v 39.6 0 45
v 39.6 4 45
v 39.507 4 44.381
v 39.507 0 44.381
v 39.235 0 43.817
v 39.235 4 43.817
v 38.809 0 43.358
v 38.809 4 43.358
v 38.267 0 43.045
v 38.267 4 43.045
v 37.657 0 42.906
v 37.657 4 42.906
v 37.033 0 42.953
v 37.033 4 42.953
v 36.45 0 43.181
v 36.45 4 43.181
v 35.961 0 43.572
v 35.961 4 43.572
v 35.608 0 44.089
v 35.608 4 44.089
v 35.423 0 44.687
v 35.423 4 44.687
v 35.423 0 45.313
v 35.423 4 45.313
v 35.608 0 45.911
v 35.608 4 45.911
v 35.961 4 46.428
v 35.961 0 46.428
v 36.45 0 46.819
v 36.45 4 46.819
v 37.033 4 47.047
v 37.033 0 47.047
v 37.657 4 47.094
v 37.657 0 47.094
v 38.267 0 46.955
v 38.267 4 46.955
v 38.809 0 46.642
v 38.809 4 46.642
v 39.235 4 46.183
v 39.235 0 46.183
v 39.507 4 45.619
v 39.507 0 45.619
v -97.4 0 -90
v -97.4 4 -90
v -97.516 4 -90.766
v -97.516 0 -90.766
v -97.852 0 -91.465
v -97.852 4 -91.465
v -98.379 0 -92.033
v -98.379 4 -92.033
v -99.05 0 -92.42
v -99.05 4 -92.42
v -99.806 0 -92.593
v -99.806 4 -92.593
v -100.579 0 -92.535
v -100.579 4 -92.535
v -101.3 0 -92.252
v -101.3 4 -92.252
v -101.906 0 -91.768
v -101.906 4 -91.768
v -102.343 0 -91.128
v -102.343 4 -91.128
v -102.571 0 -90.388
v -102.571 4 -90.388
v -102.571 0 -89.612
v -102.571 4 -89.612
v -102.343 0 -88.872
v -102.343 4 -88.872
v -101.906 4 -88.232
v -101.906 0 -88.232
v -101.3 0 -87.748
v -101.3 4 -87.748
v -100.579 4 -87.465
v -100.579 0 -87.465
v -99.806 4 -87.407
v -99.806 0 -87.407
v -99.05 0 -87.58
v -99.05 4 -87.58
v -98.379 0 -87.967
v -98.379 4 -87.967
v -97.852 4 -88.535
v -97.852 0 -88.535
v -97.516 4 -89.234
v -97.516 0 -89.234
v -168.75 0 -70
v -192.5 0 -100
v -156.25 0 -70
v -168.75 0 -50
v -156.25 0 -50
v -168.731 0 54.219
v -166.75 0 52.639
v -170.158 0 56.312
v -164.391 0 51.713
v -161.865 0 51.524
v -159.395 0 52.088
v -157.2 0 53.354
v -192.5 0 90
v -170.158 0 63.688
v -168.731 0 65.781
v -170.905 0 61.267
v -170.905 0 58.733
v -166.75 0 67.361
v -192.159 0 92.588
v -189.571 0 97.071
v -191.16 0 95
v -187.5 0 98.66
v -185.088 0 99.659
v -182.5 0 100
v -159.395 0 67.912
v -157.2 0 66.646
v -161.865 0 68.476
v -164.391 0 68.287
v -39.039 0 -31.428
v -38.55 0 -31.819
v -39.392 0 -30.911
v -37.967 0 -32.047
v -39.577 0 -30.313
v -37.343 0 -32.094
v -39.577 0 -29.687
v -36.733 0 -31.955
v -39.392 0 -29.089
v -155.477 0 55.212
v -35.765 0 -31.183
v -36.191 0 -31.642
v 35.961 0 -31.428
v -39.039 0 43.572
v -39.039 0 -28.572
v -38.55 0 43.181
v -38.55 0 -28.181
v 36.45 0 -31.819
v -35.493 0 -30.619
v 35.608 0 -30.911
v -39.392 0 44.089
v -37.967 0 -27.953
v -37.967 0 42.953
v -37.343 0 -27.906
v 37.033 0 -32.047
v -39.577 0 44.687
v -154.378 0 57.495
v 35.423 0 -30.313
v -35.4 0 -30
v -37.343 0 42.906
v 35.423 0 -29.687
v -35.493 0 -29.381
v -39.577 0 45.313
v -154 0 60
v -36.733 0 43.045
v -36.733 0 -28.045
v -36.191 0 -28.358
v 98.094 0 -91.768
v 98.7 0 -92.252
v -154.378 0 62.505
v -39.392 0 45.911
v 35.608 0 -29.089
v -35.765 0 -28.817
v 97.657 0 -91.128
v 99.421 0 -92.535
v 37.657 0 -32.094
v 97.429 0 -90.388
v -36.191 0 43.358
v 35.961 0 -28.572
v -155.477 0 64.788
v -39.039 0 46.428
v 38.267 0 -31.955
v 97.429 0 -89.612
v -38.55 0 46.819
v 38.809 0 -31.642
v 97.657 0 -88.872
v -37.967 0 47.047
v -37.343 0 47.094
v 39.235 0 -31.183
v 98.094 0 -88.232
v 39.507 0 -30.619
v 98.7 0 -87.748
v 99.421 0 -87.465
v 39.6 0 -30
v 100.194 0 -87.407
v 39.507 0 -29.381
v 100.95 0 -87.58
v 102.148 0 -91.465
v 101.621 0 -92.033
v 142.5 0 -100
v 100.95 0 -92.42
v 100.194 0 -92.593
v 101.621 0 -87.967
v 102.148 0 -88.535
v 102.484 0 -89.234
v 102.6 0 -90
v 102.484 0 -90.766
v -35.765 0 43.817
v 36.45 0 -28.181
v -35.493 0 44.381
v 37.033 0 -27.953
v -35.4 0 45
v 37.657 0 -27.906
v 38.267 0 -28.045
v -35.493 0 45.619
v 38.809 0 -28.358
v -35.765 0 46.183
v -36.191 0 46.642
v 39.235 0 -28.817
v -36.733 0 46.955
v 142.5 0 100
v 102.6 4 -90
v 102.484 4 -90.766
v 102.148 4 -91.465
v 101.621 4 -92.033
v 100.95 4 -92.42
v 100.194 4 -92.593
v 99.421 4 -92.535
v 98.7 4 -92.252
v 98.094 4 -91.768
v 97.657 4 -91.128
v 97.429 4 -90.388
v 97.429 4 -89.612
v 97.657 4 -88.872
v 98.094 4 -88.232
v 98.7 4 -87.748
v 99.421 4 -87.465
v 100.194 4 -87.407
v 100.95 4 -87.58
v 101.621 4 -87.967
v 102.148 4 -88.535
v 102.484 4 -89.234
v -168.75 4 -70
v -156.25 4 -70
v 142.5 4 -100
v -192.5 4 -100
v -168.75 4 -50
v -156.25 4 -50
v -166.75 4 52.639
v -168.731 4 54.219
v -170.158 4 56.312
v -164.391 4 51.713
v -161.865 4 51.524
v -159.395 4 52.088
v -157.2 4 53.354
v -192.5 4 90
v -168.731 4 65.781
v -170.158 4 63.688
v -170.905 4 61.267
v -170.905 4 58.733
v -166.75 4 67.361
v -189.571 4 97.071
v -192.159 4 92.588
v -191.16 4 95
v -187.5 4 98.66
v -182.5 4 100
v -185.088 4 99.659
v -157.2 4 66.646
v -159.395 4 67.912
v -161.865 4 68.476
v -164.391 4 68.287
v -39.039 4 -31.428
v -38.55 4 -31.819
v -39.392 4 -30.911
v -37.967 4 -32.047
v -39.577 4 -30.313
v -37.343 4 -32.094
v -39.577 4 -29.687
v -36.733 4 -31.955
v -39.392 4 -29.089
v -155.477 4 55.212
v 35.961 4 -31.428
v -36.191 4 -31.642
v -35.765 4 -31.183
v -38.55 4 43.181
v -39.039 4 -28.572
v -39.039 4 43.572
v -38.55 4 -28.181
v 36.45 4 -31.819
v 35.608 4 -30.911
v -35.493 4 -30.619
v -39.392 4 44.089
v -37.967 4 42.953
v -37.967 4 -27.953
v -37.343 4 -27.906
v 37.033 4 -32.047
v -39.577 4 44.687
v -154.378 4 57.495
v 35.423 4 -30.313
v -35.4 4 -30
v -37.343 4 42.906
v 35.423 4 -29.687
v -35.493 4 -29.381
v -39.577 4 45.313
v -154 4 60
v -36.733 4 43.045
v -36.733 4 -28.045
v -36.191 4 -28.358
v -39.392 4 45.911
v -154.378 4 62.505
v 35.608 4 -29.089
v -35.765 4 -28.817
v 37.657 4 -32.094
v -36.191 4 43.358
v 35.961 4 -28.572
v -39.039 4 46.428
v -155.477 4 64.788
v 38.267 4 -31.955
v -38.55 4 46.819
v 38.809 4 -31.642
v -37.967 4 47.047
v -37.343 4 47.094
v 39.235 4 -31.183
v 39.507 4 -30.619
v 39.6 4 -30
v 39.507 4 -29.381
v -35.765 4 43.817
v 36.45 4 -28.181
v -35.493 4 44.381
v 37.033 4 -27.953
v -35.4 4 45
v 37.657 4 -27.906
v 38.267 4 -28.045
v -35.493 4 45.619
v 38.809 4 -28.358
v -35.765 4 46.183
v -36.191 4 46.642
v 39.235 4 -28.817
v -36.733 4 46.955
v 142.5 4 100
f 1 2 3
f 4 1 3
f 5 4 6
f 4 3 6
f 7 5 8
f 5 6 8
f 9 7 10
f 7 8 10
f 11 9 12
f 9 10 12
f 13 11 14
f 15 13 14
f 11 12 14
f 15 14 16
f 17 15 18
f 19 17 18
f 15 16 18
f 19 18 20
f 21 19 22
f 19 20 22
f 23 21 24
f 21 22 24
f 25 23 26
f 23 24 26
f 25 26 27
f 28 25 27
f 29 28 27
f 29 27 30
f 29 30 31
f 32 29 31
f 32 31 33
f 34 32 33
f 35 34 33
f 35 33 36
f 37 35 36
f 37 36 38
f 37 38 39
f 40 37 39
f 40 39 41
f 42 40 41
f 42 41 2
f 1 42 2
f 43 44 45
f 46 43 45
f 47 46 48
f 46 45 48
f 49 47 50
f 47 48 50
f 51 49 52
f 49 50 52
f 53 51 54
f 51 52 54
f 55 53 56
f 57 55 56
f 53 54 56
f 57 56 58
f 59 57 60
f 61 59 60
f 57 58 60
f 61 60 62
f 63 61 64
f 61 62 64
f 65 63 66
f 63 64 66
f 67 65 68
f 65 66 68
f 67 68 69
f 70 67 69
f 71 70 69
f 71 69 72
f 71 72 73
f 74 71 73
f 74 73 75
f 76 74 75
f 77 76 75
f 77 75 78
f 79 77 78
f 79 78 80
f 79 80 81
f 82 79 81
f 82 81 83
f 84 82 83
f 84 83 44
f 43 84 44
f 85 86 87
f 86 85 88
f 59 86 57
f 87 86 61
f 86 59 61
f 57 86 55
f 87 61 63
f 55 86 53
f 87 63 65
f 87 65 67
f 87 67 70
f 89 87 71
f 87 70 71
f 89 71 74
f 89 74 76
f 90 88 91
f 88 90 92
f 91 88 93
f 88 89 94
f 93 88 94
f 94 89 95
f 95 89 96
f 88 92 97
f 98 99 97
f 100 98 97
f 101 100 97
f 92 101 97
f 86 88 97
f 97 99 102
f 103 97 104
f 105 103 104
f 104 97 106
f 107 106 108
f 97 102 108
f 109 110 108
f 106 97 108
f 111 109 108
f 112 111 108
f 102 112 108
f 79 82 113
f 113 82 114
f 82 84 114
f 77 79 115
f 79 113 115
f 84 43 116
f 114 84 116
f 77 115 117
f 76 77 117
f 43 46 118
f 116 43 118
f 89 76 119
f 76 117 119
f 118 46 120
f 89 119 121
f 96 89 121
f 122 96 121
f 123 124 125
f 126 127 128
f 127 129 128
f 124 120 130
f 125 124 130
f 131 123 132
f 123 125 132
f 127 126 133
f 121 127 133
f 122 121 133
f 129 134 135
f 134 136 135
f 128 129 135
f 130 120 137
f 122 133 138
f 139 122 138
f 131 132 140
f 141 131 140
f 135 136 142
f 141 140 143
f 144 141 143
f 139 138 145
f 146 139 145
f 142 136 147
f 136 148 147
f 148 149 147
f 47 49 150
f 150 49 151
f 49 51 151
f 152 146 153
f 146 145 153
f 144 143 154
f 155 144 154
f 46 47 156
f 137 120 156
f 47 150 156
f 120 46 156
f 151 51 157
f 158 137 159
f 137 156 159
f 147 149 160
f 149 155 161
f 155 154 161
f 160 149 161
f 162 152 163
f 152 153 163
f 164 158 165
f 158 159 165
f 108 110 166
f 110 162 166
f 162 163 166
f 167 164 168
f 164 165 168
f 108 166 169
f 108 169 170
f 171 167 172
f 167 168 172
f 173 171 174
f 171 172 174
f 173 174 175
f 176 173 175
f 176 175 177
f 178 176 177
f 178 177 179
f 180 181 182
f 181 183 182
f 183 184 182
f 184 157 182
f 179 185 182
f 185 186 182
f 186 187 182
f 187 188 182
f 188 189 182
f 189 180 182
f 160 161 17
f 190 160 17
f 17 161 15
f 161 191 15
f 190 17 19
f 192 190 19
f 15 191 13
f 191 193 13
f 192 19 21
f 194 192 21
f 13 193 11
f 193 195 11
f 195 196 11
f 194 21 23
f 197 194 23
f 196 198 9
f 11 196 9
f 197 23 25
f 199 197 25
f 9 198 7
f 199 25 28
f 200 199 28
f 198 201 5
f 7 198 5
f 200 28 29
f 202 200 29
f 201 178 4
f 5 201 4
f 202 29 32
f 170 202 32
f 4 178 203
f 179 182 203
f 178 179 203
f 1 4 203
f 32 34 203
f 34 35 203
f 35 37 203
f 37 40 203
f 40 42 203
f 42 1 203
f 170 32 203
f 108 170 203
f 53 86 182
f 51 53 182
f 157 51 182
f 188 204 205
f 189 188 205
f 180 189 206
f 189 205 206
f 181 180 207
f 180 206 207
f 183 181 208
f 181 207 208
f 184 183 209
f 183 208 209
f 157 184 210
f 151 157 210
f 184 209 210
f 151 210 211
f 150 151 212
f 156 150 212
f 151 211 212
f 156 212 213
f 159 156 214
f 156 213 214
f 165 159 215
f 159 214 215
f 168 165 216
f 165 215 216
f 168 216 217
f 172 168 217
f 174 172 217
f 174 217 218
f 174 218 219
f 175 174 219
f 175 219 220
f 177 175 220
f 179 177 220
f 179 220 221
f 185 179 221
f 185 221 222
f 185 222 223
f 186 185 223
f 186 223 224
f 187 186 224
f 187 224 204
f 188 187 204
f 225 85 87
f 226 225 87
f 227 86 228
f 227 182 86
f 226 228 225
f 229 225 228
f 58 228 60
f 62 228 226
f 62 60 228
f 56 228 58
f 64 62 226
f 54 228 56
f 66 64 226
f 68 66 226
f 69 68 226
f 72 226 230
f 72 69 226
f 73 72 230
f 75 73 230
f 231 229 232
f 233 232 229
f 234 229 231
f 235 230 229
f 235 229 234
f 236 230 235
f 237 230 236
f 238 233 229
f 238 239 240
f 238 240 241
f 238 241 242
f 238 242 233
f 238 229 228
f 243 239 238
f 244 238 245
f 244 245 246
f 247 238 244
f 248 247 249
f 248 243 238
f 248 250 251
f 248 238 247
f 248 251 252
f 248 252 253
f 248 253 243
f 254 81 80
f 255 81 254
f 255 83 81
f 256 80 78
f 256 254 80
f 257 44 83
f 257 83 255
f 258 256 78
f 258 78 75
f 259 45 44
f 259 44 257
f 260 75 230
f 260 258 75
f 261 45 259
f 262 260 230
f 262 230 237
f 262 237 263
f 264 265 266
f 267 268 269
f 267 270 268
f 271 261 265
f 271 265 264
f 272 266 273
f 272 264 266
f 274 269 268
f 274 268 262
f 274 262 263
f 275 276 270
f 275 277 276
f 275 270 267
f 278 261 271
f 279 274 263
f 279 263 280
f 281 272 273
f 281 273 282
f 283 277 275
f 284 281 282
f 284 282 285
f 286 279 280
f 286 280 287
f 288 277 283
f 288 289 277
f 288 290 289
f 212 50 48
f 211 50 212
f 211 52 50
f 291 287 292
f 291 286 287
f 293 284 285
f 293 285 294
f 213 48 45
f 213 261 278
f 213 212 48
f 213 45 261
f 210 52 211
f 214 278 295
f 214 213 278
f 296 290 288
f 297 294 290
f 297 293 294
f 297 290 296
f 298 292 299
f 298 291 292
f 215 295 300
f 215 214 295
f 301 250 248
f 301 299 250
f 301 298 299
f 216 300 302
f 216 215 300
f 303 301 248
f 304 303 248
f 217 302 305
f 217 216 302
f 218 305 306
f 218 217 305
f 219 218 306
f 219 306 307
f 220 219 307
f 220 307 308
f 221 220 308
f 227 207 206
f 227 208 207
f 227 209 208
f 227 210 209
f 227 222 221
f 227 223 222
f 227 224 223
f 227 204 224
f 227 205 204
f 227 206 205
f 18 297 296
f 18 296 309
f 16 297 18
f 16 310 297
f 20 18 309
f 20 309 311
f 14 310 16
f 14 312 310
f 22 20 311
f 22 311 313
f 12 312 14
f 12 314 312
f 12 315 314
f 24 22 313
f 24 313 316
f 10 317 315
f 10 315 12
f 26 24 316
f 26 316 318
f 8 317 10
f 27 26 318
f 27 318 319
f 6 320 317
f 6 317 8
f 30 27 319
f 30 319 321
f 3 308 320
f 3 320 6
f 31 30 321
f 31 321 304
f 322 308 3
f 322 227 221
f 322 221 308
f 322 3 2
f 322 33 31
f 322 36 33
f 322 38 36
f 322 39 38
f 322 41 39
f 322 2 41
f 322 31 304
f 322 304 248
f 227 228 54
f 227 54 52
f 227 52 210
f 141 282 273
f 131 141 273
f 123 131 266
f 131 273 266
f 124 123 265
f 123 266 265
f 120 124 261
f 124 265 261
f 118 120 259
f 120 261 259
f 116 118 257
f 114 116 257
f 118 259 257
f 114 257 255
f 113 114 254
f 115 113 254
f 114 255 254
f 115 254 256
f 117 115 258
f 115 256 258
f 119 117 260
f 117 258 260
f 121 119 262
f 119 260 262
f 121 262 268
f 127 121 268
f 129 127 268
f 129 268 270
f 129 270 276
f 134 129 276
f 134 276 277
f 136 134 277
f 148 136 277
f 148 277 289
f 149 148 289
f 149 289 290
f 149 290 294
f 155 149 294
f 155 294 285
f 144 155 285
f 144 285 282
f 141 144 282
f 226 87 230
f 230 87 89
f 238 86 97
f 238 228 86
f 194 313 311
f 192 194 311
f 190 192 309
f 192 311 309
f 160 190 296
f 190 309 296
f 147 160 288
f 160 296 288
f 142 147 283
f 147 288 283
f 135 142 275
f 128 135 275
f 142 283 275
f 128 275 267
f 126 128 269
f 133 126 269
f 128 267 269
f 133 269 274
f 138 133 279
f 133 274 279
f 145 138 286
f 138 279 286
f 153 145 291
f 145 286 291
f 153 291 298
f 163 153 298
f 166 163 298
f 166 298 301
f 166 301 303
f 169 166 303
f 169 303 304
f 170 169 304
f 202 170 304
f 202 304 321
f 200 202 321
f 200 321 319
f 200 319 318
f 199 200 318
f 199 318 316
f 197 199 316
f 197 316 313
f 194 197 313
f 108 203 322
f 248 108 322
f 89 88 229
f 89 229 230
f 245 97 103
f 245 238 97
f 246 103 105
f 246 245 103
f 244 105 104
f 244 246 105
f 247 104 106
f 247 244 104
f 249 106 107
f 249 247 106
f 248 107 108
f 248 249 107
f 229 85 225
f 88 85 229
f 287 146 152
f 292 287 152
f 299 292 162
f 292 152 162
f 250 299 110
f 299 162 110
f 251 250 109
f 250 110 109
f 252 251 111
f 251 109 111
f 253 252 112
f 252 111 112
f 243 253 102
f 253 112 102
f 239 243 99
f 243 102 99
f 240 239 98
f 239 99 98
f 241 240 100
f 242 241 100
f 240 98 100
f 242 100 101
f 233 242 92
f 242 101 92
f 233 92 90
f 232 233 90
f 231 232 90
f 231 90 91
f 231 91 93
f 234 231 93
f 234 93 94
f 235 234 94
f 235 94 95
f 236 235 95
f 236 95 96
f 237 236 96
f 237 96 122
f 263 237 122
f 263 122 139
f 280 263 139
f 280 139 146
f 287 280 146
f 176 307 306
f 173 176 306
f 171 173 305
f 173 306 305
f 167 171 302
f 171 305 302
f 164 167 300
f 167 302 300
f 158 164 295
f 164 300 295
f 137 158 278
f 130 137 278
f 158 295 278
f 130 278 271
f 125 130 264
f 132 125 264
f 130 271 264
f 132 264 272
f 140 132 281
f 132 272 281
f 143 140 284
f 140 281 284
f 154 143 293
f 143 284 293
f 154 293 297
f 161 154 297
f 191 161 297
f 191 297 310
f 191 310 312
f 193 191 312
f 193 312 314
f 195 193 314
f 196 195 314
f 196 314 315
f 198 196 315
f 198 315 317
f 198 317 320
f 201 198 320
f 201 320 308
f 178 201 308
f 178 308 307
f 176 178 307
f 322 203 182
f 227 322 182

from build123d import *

# Parameters (mm, degrees)
SKETCH_1_W             = 285
SKETCH_1_H             = 200
EXTRUDE_1_DEPTH        = 4
SKETCH_2_R             = 2.1
SKETCH_2_R_2           = 2.6
CUT_EXTRUDE_1_DEPTH    = 5
SKETCH_3_W             = 200
SKETCH_3_H             = 4
EXTRUDE_1002_DEPTH     = 50
SKETCH_4_R             = 8.5
SKETCH_4_W             = 12.5
SKETCH_4_H             = 20
CUT_EXTRUDE_1350_DEPTH = 5
FILLET_1_R             = 10


with BuildPart() as part:
    # 草图1 → 凸台-拉伸1 (new body)
    with BuildSketch(Plane(origin=(0, 0, 0), x_dir=(1, 0, 0), z_dir=(0, 1, 0))):
        Rectangle(SKETCH_1_W, SKETCH_1_H)
    extrude(amount=EXTRUDE_1_DEPTH)

    # 草图2 → 切除-拉伸1 (cut, through all)
    with BuildSketch(Plane(origin=(0, 4, 0), x_dir=(1, 0, 0), z_dir=(0, 1, 0))):
        with Locations((-37.5, 30)):
            Circle(SKETCH_2_R)
        with Locations((37.5, 30)):
            Circle(SKETCH_2_R)
        with Locations((37.5, -45)):
            Circle(SKETCH_2_R)
        with Locations((-37.5, -45)):
            Circle(SKETCH_2_R)
        with Locations((-100, 90)):
            Circle(SKETCH_2_R_2)
        with Locations((100, 90)):
            Circle(SKETCH_2_R_2)
    extrude(amount=-CUT_EXTRUDE_1_DEPTH, mode=Mode.SUBTRACT)

    # 草图3 → Extrude 1002 (add)
    with BuildSketch(Plane.ZY.offset(142.5)):
        with Locations((0, 2)):
            Rectangle(SKETCH_3_W, SKETCH_3_H)
    extrude(amount=EXTRUDE_1002_DEPTH)

    # 草图4 → Cut-Extrude 1350 (cut, through all)
    with BuildSketch(Plane.XZ):
        with Locations((-162.5, 60)):
            Circle(SKETCH_4_R)
        with Locations((-162.5, -60)):
            Rectangle(SKETCH_4_W, SKETCH_4_H)
    extrude(amount=-CUT_EXTRUDE_1350_DEPTH, mode=Mode.SUBTRACT)

    # 圆角1
    fillet_1_edges = [part.edges().sort_by_distance(p)[0] for p in [
        (-192.5, 2, 100),
    ]]
    fillet(fillet_1_edges, radius=FILLET_1_R)


solid = part.part
